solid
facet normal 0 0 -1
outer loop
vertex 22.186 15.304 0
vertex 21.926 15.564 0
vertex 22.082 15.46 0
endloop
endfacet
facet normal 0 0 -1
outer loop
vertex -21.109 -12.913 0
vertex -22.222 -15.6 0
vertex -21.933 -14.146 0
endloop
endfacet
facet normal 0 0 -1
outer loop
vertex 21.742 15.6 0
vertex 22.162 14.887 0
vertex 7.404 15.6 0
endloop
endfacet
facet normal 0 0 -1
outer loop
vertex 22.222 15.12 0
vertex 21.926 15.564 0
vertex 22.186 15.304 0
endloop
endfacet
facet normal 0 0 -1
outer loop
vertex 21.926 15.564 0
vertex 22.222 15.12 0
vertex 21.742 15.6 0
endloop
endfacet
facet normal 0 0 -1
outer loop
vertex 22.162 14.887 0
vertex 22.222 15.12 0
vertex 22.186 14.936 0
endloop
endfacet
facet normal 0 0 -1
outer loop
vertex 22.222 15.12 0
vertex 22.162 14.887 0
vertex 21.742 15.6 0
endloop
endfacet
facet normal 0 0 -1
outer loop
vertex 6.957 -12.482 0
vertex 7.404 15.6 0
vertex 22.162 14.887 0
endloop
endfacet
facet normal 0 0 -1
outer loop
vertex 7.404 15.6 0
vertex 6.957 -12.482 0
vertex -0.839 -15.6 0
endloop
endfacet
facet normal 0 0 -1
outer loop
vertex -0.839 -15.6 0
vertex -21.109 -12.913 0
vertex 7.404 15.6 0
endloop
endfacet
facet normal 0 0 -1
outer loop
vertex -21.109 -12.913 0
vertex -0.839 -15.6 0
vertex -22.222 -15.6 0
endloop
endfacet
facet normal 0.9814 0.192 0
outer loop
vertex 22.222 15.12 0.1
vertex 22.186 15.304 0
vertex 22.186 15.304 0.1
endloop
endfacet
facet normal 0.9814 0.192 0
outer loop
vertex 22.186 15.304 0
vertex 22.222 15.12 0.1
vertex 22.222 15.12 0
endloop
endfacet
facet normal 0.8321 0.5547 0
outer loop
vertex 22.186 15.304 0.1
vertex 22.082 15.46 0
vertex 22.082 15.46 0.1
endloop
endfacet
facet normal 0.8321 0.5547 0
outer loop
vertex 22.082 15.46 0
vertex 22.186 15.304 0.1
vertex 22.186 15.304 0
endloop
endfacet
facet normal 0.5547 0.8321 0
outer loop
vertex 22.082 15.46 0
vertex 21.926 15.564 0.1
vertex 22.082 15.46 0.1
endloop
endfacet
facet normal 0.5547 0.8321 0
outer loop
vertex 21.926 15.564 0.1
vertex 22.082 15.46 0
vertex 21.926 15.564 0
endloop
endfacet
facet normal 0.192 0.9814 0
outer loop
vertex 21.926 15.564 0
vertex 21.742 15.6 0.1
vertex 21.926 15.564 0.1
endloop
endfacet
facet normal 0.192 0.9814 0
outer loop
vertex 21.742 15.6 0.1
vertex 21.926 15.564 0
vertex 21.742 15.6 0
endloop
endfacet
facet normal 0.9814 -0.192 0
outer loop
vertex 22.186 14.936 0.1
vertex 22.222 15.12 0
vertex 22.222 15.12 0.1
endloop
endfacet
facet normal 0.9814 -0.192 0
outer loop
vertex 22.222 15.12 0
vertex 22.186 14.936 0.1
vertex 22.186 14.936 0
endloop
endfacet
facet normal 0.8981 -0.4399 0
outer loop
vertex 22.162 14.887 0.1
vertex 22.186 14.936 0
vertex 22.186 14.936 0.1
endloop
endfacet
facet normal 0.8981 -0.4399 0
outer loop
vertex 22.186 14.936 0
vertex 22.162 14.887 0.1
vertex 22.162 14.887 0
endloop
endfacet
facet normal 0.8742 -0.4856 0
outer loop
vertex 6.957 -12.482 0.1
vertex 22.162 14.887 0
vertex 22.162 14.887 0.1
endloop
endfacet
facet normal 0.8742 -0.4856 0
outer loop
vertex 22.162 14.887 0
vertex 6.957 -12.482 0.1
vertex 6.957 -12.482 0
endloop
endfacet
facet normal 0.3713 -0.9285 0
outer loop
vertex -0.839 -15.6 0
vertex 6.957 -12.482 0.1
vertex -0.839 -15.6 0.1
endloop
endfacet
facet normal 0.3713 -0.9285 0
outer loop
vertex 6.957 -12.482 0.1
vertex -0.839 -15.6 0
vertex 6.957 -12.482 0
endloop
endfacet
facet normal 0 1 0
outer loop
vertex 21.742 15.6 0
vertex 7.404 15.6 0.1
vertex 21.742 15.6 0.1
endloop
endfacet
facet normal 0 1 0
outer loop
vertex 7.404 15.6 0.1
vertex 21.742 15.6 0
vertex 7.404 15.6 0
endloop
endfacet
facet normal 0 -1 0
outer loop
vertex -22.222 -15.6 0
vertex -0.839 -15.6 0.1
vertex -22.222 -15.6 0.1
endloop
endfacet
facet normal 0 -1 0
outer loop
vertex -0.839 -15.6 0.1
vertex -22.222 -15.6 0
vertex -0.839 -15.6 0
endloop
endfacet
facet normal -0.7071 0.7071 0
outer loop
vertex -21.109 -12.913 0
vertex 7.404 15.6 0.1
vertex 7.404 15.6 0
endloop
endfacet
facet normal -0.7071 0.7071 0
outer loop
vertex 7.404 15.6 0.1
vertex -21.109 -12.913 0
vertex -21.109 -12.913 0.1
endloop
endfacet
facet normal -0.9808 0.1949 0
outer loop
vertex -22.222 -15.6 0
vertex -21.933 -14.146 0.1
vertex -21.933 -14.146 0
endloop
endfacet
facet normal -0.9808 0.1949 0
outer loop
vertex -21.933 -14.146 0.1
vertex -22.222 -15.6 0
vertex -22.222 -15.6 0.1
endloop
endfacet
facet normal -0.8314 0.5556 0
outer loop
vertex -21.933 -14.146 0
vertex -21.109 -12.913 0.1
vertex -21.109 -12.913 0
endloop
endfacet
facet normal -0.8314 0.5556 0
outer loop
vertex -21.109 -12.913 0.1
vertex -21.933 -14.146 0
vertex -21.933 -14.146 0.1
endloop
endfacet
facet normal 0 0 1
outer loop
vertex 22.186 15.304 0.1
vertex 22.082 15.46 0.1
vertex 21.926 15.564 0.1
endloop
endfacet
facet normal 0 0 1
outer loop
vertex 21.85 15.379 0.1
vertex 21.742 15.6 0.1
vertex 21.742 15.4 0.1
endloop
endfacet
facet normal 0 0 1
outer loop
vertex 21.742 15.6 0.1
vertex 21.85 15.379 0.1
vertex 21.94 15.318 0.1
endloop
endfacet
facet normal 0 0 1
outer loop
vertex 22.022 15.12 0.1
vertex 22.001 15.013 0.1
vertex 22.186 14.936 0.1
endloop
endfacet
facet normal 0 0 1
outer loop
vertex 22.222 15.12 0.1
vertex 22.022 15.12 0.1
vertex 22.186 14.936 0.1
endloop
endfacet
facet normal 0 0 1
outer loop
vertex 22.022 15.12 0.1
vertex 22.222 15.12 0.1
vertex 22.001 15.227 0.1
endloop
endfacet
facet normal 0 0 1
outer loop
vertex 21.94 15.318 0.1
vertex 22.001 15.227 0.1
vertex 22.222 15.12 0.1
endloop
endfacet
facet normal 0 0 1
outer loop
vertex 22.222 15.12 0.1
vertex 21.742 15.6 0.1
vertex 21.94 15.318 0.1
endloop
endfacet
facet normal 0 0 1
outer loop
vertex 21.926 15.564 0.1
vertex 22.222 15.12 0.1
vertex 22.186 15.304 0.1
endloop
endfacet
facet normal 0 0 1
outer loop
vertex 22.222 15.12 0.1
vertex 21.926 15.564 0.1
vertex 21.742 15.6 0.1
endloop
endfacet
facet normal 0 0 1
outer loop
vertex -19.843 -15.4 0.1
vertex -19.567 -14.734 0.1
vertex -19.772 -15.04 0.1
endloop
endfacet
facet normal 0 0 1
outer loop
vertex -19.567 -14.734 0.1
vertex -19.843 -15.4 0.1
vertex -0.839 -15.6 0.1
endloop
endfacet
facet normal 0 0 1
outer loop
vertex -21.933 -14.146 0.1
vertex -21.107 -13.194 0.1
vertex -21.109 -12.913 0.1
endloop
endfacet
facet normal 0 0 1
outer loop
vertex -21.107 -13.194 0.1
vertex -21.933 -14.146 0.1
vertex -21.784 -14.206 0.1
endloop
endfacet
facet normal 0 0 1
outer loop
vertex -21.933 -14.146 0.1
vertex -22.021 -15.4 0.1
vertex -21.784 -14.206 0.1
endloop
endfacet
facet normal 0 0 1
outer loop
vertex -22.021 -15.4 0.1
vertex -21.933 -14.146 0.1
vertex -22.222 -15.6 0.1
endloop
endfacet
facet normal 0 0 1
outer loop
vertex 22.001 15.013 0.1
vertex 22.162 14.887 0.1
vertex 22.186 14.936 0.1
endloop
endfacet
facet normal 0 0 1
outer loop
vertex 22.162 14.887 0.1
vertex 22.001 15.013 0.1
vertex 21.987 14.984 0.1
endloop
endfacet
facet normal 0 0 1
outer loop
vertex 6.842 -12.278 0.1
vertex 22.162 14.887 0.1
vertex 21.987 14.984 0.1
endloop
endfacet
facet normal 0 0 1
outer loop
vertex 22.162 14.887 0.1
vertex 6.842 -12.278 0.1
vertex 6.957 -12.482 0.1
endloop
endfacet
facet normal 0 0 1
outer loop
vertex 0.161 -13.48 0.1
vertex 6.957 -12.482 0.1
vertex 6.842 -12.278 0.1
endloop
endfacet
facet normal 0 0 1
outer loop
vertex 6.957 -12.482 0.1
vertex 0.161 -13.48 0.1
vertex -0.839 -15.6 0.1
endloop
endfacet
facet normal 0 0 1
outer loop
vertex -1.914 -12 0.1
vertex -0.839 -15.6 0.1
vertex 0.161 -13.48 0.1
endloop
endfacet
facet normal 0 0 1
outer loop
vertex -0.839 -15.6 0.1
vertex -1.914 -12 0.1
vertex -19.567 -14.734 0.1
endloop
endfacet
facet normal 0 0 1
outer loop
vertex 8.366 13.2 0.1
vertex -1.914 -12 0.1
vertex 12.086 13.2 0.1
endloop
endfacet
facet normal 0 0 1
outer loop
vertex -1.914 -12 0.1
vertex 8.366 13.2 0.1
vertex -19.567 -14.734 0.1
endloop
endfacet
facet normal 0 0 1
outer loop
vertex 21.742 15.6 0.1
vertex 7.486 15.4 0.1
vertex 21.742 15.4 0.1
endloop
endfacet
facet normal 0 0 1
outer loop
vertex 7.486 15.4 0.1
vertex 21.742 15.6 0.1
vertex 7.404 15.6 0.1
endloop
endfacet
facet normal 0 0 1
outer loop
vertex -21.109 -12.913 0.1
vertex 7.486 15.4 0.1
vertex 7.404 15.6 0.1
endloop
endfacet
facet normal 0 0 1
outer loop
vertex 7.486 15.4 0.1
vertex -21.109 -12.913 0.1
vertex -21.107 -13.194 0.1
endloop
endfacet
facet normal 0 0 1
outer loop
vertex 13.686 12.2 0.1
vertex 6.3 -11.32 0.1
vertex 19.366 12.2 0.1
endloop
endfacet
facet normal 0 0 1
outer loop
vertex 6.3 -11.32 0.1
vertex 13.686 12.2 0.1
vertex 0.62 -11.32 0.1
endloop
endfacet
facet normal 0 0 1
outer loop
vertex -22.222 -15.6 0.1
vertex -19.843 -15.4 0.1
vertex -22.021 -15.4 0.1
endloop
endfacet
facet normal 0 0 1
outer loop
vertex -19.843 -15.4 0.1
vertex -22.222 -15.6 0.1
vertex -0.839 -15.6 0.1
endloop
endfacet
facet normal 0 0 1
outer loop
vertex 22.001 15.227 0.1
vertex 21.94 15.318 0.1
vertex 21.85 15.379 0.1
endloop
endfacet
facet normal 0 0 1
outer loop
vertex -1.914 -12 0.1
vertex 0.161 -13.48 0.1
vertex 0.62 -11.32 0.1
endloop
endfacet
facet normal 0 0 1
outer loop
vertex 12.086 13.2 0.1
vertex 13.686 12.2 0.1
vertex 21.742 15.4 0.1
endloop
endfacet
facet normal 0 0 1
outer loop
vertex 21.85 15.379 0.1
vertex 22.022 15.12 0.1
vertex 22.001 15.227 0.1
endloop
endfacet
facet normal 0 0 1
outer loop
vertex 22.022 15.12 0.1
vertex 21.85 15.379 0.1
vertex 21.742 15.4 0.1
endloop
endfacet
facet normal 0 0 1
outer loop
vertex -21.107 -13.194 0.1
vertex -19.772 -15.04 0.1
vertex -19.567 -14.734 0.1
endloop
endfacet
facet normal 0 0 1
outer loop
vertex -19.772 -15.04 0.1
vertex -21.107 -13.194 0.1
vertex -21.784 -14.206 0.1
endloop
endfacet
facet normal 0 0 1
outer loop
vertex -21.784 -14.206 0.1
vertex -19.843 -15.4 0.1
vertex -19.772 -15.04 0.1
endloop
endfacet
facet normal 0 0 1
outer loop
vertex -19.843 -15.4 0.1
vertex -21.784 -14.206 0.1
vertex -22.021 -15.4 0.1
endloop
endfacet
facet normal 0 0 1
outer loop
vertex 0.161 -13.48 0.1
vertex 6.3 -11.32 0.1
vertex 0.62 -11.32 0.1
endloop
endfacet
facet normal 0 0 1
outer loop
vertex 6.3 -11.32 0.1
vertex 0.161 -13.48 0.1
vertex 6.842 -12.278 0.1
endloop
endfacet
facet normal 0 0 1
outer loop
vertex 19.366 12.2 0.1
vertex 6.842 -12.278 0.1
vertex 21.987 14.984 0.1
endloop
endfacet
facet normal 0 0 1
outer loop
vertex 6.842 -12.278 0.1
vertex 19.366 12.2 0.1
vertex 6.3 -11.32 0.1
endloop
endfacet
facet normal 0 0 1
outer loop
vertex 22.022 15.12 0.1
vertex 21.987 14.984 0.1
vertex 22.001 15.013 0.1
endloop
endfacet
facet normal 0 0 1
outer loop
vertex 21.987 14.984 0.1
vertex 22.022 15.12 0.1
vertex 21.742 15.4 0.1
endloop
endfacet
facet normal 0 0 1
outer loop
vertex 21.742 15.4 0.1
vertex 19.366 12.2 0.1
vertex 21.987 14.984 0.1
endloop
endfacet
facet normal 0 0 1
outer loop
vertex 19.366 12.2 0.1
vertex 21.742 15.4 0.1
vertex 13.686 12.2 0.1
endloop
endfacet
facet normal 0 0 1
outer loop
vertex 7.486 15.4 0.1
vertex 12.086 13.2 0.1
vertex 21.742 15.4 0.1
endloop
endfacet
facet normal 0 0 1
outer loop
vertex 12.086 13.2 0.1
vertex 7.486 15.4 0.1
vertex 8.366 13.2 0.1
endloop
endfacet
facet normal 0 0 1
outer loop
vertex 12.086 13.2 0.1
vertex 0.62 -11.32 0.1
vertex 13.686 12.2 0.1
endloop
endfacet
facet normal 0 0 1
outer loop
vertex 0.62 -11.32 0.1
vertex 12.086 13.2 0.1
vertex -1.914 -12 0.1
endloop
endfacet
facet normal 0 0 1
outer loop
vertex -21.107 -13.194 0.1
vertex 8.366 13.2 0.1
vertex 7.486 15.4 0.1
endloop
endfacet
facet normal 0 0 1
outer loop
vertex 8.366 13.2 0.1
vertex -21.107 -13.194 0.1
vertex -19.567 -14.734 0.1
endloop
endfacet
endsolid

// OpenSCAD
// file: 169665b.scad
use <../lib.scad>
use <169665a.scad>
function ldraw_lib__169665b() = [
// 0 Sticker  3.9 x  5.6 with Black Space Shuttle Tail Lines Right Side
// 0 Name: 169665b.dat
// 0 Author: Chris Böhnke [KnightOfTarenta]
// 0 !LDRAW_ORG Part UPDATE 2026-06
// 0 !LICENSE Licensed under CC BY 4.0 : see CAreadme.txt
// 
// 0 BFC CERTIFY CCW
  [0,"BFC","CERTIFY"],
  [0,"BFC","CCW"],
// 
// 0 !KEYWORDS Bricklink 6339stk01, Brickowl 588738, Launch Command
// 0 !KEYWORDS Rebrickable 169665, set 6339, Shuttle Launch Pad, space port, town
// 
// 0 !HISTORY 2026-06-28 [OrionP] Official Update 2026-06
// 
// 1 16 0 0 0 -1 0 0 0 1 0 0 0 1 169665a.dat
  [1,16,0,0,0,-1,0,0,0,1,0,0,0,1, ldraw_lib__169665a()],
];
module ldraw_lib__169665b(step=0, col=false, unit=2/5, alt=false, line=0.2, solid=!$preview)
    makepoly(ldraw_lib__169665b(), step=step, col=col, unit=unit, alt=alt, line=line, solid=solid);
ldraw_lib__169665b(line=0.2);
// main file
use <../lib.scad>
use <169665b.scad>
function ldraw_lib__169655b() = [
// 0 =Sticker  3.9 x  5.6 with Black Space Shuttle Tail Lines Right Side
// 0 Name: 169655b.dat
// 0 Author: Chris Böhnke [KnightOfTarenta]
// 0 !LDRAW_ORG Part Alias UPDATE 2026-06
// 0 !LICENSE Licensed under CC BY 4.0 : see CAreadme.txt
// 
// 0 BFC CERTIFY CCW
  [0,"BFC","CERTIFY"],
  [0,"BFC","CCW"],
// 
// 0 !KEYWORDS Bricklink 6544stk01, Brickowl 420128, Launch Command
// 0 !KEYWORDS Rebrickable 169655, Set 6544, Shuttle Transcon 2, space port, town
// 
// 0 !HISTORY 2026-06-28 [OrionP] Official Update 2026-06
// 
// 1 16 0 0 0 1 0 0 0 1 0 0 0 1 169665b.dat
  [1,16,0,0,0,1,0,0,0,1,0,0,0,1, ldraw_lib__169665b()],
];
module ldraw_lib__169655b(step=0, col=false, unit=2/5, alt=false, line=0.2, solid=!$preview)
    makepoly(ldraw_lib__169655b(), step=step, col=col, unit=unit, alt=alt, line=line, solid=solid);
ldraw_lib__169655b(line=0.2);
